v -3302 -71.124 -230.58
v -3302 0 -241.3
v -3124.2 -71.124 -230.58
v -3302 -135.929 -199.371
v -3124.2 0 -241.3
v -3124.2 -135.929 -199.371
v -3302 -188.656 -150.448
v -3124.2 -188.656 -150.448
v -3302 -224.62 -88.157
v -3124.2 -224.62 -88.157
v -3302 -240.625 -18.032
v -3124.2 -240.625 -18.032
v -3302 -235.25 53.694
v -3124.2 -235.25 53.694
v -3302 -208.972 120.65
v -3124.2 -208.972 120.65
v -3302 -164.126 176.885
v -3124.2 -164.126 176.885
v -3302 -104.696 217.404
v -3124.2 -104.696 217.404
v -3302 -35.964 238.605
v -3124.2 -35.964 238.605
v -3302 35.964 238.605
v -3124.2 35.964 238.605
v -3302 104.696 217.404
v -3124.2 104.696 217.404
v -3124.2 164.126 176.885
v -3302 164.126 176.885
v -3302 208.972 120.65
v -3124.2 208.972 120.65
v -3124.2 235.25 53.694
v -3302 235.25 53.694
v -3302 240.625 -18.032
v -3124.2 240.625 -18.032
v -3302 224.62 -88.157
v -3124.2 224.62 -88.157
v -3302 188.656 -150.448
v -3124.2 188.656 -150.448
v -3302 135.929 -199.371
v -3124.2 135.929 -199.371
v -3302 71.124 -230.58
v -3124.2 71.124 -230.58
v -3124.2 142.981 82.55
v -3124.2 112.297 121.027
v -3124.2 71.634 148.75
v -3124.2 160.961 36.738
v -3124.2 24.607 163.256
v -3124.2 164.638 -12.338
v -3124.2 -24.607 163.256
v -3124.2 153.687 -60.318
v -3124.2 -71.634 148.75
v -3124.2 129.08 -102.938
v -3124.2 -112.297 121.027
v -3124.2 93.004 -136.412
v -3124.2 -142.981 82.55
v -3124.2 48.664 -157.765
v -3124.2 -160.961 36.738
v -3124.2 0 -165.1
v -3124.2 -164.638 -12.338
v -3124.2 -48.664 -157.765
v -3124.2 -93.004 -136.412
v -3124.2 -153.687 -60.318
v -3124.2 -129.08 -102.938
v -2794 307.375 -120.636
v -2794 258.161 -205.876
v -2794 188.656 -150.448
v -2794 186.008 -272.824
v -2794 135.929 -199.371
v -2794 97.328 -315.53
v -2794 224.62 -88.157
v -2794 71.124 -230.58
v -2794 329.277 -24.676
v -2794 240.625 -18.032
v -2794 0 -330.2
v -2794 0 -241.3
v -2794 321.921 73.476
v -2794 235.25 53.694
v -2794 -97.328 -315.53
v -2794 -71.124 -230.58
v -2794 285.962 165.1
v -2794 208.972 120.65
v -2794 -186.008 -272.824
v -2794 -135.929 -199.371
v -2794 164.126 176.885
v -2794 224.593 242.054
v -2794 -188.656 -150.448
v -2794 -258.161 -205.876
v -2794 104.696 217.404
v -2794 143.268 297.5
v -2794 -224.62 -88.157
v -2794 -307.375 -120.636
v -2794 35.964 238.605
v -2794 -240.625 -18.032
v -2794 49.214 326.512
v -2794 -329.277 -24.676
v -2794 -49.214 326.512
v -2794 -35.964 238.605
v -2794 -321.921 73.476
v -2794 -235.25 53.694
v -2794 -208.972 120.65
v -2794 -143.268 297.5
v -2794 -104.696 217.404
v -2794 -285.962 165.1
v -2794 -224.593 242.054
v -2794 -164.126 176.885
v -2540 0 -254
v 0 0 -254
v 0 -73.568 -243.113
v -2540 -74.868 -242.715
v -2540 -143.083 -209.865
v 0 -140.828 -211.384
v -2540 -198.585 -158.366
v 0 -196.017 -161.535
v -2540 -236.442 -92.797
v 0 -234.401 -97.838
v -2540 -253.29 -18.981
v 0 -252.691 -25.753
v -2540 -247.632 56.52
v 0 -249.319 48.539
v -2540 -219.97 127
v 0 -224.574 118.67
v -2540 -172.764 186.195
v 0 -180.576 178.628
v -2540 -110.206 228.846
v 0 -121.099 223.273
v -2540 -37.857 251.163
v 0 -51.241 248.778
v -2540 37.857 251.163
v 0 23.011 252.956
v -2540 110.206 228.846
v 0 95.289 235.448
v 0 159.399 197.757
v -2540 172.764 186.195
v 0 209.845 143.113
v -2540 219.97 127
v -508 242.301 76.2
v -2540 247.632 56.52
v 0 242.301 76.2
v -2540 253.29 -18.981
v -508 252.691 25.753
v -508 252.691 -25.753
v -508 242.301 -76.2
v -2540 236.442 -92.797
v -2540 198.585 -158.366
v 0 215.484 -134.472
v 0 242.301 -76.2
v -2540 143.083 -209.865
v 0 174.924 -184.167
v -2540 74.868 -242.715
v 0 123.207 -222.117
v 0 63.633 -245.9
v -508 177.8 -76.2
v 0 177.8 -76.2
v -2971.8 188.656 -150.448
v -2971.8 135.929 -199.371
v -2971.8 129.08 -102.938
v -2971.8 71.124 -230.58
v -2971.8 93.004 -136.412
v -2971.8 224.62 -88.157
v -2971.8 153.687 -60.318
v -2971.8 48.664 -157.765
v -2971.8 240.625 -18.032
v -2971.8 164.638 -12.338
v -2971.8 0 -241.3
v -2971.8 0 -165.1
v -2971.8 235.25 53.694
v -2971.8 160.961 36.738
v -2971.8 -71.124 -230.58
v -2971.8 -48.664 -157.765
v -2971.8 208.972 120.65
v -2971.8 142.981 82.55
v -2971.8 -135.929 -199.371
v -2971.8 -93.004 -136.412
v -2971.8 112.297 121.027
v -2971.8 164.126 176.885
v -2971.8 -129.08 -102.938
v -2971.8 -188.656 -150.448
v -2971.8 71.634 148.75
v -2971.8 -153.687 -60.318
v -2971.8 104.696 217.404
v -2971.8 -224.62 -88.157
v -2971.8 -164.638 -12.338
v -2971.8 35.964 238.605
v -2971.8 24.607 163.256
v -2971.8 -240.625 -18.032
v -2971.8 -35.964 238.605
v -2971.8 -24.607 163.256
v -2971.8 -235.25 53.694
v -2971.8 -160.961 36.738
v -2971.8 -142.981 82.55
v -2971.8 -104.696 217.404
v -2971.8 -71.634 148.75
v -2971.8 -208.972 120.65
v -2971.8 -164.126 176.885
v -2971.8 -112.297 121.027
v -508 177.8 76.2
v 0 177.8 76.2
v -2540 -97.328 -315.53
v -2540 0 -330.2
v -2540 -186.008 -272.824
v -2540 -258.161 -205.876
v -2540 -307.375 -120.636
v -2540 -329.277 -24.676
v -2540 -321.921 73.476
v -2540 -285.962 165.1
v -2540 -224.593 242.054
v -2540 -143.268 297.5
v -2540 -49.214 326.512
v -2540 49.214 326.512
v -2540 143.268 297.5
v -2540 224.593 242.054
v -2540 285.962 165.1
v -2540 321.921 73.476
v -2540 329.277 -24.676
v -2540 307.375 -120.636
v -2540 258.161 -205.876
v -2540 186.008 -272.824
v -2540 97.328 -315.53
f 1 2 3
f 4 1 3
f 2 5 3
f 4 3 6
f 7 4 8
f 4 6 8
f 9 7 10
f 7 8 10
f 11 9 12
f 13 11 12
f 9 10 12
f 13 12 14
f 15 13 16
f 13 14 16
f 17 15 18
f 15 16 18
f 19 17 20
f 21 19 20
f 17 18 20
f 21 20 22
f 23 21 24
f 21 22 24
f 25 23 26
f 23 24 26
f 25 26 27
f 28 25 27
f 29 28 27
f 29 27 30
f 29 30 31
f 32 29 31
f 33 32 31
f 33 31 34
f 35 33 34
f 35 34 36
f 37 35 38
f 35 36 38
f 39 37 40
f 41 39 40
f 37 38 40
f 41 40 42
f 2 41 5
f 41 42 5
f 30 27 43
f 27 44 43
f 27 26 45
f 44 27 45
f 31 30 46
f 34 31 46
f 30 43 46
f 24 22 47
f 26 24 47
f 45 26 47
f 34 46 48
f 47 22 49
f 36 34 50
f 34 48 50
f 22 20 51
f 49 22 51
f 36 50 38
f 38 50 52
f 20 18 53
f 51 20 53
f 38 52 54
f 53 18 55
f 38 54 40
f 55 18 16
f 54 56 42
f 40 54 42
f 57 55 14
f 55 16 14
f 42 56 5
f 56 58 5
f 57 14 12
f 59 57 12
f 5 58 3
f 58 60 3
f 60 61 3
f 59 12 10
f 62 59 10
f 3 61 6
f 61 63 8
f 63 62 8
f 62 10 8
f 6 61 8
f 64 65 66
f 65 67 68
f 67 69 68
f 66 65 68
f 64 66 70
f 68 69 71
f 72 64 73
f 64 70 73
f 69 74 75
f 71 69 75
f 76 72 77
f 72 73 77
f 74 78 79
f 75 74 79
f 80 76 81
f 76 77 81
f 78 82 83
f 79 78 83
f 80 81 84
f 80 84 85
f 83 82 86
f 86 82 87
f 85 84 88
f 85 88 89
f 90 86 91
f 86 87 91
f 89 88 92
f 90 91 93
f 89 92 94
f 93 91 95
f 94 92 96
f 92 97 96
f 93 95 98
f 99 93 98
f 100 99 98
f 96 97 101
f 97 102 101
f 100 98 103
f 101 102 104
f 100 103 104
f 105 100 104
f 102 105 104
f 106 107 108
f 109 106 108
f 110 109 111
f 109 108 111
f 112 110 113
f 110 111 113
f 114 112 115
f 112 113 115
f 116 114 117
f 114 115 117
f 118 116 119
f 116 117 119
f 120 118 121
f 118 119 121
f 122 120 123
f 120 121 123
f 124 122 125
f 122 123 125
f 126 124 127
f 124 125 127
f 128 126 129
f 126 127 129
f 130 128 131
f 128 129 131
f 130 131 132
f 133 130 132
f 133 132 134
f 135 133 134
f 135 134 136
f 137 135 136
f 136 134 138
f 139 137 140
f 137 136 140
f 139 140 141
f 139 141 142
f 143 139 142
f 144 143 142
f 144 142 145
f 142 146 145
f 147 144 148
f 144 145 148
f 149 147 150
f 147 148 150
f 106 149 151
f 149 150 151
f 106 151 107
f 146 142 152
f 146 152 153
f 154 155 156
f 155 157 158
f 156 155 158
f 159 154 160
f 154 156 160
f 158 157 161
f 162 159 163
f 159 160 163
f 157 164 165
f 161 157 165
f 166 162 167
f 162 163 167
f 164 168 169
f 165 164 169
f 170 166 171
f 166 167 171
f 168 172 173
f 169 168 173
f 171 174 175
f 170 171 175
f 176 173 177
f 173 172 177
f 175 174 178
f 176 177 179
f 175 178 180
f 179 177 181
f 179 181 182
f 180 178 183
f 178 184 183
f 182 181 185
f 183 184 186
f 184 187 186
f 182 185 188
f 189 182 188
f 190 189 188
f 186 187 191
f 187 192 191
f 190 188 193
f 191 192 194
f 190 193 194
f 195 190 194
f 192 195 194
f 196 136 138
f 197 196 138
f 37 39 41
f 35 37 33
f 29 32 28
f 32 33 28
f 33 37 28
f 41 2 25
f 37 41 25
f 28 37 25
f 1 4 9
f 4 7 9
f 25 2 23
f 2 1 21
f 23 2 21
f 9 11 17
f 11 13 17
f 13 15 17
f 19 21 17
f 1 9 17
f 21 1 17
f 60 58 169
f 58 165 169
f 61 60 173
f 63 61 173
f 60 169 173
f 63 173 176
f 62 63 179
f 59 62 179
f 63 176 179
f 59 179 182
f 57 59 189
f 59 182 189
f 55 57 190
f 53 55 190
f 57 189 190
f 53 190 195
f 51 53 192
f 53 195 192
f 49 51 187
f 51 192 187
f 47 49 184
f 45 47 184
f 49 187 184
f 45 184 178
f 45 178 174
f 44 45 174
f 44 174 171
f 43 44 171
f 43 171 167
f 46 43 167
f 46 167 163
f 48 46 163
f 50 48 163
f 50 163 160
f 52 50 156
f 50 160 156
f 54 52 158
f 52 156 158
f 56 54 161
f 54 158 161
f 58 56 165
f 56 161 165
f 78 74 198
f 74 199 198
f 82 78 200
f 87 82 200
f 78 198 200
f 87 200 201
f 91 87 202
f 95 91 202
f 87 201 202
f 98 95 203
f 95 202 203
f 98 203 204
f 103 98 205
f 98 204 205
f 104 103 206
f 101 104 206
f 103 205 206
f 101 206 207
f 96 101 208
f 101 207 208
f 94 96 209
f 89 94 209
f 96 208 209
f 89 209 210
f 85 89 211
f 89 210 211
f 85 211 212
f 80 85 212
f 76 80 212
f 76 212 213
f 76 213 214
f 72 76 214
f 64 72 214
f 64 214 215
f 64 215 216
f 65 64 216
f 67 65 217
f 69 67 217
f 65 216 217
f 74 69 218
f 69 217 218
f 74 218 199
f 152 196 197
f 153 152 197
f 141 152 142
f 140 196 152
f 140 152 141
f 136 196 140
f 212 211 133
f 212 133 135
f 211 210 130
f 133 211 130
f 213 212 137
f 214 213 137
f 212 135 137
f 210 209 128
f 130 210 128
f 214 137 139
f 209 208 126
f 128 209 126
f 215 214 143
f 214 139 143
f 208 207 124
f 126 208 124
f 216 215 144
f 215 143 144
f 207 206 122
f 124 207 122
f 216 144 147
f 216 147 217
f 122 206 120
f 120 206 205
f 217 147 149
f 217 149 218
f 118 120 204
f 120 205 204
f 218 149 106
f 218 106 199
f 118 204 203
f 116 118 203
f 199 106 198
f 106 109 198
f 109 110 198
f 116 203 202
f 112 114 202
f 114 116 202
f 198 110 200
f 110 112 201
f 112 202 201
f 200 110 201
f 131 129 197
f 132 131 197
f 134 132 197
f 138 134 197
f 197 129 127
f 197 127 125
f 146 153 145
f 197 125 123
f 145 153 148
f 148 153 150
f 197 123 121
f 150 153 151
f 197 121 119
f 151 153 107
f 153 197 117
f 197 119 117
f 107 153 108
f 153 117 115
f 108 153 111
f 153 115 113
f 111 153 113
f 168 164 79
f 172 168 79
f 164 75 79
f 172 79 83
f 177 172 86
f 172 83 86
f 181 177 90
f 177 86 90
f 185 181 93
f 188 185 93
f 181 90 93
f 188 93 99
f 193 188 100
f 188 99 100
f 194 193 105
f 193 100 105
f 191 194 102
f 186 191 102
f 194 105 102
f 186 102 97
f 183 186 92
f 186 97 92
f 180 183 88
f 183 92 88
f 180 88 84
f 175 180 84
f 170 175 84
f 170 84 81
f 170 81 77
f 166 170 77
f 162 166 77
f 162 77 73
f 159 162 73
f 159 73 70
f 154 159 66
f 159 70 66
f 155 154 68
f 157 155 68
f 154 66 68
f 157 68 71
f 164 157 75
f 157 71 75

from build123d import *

# Parameters (mm, degrees)
SKETCH4_W          = 508
SKETCH4_H          = 127
CUT_EXTRUDE1_DEPTH = 76.2


with BuildPart() as part:
    # Sketch1 → Revolve1 (revolve)
    with BuildSketch(Plane(origin=(0, 0, 0), x_dir=(1, 0, 0), z_dir=(0, 1, 0))):
        Polygon((0, 0), (-3302, 0), (-3302, 241.3), (-3124.2, 241.3), (-3124.2, 165.1), (-2971.8, 165.1), (-2971.8, 241.3), (-2794, 241.3), (-2794, 330.2), (-2540, 330.2), (-2540, 254), (0, 254), align=None)
    revolve(axis=Axis((0, 0, 0), (-1, 0, 0)))

    # Sketch4 → Cut-Extrude1 (cut, symmetric)
    with BuildSketch(Plane.XY):
        with Locations((-254, 241.3)):
            Rectangle(SKETCH4_W, SKETCH4_H)
    extrude(amount=CUT_EXTRUDE1_DEPTH, both=True, mode=Mode.SUBTRACT)


solid = part.part
